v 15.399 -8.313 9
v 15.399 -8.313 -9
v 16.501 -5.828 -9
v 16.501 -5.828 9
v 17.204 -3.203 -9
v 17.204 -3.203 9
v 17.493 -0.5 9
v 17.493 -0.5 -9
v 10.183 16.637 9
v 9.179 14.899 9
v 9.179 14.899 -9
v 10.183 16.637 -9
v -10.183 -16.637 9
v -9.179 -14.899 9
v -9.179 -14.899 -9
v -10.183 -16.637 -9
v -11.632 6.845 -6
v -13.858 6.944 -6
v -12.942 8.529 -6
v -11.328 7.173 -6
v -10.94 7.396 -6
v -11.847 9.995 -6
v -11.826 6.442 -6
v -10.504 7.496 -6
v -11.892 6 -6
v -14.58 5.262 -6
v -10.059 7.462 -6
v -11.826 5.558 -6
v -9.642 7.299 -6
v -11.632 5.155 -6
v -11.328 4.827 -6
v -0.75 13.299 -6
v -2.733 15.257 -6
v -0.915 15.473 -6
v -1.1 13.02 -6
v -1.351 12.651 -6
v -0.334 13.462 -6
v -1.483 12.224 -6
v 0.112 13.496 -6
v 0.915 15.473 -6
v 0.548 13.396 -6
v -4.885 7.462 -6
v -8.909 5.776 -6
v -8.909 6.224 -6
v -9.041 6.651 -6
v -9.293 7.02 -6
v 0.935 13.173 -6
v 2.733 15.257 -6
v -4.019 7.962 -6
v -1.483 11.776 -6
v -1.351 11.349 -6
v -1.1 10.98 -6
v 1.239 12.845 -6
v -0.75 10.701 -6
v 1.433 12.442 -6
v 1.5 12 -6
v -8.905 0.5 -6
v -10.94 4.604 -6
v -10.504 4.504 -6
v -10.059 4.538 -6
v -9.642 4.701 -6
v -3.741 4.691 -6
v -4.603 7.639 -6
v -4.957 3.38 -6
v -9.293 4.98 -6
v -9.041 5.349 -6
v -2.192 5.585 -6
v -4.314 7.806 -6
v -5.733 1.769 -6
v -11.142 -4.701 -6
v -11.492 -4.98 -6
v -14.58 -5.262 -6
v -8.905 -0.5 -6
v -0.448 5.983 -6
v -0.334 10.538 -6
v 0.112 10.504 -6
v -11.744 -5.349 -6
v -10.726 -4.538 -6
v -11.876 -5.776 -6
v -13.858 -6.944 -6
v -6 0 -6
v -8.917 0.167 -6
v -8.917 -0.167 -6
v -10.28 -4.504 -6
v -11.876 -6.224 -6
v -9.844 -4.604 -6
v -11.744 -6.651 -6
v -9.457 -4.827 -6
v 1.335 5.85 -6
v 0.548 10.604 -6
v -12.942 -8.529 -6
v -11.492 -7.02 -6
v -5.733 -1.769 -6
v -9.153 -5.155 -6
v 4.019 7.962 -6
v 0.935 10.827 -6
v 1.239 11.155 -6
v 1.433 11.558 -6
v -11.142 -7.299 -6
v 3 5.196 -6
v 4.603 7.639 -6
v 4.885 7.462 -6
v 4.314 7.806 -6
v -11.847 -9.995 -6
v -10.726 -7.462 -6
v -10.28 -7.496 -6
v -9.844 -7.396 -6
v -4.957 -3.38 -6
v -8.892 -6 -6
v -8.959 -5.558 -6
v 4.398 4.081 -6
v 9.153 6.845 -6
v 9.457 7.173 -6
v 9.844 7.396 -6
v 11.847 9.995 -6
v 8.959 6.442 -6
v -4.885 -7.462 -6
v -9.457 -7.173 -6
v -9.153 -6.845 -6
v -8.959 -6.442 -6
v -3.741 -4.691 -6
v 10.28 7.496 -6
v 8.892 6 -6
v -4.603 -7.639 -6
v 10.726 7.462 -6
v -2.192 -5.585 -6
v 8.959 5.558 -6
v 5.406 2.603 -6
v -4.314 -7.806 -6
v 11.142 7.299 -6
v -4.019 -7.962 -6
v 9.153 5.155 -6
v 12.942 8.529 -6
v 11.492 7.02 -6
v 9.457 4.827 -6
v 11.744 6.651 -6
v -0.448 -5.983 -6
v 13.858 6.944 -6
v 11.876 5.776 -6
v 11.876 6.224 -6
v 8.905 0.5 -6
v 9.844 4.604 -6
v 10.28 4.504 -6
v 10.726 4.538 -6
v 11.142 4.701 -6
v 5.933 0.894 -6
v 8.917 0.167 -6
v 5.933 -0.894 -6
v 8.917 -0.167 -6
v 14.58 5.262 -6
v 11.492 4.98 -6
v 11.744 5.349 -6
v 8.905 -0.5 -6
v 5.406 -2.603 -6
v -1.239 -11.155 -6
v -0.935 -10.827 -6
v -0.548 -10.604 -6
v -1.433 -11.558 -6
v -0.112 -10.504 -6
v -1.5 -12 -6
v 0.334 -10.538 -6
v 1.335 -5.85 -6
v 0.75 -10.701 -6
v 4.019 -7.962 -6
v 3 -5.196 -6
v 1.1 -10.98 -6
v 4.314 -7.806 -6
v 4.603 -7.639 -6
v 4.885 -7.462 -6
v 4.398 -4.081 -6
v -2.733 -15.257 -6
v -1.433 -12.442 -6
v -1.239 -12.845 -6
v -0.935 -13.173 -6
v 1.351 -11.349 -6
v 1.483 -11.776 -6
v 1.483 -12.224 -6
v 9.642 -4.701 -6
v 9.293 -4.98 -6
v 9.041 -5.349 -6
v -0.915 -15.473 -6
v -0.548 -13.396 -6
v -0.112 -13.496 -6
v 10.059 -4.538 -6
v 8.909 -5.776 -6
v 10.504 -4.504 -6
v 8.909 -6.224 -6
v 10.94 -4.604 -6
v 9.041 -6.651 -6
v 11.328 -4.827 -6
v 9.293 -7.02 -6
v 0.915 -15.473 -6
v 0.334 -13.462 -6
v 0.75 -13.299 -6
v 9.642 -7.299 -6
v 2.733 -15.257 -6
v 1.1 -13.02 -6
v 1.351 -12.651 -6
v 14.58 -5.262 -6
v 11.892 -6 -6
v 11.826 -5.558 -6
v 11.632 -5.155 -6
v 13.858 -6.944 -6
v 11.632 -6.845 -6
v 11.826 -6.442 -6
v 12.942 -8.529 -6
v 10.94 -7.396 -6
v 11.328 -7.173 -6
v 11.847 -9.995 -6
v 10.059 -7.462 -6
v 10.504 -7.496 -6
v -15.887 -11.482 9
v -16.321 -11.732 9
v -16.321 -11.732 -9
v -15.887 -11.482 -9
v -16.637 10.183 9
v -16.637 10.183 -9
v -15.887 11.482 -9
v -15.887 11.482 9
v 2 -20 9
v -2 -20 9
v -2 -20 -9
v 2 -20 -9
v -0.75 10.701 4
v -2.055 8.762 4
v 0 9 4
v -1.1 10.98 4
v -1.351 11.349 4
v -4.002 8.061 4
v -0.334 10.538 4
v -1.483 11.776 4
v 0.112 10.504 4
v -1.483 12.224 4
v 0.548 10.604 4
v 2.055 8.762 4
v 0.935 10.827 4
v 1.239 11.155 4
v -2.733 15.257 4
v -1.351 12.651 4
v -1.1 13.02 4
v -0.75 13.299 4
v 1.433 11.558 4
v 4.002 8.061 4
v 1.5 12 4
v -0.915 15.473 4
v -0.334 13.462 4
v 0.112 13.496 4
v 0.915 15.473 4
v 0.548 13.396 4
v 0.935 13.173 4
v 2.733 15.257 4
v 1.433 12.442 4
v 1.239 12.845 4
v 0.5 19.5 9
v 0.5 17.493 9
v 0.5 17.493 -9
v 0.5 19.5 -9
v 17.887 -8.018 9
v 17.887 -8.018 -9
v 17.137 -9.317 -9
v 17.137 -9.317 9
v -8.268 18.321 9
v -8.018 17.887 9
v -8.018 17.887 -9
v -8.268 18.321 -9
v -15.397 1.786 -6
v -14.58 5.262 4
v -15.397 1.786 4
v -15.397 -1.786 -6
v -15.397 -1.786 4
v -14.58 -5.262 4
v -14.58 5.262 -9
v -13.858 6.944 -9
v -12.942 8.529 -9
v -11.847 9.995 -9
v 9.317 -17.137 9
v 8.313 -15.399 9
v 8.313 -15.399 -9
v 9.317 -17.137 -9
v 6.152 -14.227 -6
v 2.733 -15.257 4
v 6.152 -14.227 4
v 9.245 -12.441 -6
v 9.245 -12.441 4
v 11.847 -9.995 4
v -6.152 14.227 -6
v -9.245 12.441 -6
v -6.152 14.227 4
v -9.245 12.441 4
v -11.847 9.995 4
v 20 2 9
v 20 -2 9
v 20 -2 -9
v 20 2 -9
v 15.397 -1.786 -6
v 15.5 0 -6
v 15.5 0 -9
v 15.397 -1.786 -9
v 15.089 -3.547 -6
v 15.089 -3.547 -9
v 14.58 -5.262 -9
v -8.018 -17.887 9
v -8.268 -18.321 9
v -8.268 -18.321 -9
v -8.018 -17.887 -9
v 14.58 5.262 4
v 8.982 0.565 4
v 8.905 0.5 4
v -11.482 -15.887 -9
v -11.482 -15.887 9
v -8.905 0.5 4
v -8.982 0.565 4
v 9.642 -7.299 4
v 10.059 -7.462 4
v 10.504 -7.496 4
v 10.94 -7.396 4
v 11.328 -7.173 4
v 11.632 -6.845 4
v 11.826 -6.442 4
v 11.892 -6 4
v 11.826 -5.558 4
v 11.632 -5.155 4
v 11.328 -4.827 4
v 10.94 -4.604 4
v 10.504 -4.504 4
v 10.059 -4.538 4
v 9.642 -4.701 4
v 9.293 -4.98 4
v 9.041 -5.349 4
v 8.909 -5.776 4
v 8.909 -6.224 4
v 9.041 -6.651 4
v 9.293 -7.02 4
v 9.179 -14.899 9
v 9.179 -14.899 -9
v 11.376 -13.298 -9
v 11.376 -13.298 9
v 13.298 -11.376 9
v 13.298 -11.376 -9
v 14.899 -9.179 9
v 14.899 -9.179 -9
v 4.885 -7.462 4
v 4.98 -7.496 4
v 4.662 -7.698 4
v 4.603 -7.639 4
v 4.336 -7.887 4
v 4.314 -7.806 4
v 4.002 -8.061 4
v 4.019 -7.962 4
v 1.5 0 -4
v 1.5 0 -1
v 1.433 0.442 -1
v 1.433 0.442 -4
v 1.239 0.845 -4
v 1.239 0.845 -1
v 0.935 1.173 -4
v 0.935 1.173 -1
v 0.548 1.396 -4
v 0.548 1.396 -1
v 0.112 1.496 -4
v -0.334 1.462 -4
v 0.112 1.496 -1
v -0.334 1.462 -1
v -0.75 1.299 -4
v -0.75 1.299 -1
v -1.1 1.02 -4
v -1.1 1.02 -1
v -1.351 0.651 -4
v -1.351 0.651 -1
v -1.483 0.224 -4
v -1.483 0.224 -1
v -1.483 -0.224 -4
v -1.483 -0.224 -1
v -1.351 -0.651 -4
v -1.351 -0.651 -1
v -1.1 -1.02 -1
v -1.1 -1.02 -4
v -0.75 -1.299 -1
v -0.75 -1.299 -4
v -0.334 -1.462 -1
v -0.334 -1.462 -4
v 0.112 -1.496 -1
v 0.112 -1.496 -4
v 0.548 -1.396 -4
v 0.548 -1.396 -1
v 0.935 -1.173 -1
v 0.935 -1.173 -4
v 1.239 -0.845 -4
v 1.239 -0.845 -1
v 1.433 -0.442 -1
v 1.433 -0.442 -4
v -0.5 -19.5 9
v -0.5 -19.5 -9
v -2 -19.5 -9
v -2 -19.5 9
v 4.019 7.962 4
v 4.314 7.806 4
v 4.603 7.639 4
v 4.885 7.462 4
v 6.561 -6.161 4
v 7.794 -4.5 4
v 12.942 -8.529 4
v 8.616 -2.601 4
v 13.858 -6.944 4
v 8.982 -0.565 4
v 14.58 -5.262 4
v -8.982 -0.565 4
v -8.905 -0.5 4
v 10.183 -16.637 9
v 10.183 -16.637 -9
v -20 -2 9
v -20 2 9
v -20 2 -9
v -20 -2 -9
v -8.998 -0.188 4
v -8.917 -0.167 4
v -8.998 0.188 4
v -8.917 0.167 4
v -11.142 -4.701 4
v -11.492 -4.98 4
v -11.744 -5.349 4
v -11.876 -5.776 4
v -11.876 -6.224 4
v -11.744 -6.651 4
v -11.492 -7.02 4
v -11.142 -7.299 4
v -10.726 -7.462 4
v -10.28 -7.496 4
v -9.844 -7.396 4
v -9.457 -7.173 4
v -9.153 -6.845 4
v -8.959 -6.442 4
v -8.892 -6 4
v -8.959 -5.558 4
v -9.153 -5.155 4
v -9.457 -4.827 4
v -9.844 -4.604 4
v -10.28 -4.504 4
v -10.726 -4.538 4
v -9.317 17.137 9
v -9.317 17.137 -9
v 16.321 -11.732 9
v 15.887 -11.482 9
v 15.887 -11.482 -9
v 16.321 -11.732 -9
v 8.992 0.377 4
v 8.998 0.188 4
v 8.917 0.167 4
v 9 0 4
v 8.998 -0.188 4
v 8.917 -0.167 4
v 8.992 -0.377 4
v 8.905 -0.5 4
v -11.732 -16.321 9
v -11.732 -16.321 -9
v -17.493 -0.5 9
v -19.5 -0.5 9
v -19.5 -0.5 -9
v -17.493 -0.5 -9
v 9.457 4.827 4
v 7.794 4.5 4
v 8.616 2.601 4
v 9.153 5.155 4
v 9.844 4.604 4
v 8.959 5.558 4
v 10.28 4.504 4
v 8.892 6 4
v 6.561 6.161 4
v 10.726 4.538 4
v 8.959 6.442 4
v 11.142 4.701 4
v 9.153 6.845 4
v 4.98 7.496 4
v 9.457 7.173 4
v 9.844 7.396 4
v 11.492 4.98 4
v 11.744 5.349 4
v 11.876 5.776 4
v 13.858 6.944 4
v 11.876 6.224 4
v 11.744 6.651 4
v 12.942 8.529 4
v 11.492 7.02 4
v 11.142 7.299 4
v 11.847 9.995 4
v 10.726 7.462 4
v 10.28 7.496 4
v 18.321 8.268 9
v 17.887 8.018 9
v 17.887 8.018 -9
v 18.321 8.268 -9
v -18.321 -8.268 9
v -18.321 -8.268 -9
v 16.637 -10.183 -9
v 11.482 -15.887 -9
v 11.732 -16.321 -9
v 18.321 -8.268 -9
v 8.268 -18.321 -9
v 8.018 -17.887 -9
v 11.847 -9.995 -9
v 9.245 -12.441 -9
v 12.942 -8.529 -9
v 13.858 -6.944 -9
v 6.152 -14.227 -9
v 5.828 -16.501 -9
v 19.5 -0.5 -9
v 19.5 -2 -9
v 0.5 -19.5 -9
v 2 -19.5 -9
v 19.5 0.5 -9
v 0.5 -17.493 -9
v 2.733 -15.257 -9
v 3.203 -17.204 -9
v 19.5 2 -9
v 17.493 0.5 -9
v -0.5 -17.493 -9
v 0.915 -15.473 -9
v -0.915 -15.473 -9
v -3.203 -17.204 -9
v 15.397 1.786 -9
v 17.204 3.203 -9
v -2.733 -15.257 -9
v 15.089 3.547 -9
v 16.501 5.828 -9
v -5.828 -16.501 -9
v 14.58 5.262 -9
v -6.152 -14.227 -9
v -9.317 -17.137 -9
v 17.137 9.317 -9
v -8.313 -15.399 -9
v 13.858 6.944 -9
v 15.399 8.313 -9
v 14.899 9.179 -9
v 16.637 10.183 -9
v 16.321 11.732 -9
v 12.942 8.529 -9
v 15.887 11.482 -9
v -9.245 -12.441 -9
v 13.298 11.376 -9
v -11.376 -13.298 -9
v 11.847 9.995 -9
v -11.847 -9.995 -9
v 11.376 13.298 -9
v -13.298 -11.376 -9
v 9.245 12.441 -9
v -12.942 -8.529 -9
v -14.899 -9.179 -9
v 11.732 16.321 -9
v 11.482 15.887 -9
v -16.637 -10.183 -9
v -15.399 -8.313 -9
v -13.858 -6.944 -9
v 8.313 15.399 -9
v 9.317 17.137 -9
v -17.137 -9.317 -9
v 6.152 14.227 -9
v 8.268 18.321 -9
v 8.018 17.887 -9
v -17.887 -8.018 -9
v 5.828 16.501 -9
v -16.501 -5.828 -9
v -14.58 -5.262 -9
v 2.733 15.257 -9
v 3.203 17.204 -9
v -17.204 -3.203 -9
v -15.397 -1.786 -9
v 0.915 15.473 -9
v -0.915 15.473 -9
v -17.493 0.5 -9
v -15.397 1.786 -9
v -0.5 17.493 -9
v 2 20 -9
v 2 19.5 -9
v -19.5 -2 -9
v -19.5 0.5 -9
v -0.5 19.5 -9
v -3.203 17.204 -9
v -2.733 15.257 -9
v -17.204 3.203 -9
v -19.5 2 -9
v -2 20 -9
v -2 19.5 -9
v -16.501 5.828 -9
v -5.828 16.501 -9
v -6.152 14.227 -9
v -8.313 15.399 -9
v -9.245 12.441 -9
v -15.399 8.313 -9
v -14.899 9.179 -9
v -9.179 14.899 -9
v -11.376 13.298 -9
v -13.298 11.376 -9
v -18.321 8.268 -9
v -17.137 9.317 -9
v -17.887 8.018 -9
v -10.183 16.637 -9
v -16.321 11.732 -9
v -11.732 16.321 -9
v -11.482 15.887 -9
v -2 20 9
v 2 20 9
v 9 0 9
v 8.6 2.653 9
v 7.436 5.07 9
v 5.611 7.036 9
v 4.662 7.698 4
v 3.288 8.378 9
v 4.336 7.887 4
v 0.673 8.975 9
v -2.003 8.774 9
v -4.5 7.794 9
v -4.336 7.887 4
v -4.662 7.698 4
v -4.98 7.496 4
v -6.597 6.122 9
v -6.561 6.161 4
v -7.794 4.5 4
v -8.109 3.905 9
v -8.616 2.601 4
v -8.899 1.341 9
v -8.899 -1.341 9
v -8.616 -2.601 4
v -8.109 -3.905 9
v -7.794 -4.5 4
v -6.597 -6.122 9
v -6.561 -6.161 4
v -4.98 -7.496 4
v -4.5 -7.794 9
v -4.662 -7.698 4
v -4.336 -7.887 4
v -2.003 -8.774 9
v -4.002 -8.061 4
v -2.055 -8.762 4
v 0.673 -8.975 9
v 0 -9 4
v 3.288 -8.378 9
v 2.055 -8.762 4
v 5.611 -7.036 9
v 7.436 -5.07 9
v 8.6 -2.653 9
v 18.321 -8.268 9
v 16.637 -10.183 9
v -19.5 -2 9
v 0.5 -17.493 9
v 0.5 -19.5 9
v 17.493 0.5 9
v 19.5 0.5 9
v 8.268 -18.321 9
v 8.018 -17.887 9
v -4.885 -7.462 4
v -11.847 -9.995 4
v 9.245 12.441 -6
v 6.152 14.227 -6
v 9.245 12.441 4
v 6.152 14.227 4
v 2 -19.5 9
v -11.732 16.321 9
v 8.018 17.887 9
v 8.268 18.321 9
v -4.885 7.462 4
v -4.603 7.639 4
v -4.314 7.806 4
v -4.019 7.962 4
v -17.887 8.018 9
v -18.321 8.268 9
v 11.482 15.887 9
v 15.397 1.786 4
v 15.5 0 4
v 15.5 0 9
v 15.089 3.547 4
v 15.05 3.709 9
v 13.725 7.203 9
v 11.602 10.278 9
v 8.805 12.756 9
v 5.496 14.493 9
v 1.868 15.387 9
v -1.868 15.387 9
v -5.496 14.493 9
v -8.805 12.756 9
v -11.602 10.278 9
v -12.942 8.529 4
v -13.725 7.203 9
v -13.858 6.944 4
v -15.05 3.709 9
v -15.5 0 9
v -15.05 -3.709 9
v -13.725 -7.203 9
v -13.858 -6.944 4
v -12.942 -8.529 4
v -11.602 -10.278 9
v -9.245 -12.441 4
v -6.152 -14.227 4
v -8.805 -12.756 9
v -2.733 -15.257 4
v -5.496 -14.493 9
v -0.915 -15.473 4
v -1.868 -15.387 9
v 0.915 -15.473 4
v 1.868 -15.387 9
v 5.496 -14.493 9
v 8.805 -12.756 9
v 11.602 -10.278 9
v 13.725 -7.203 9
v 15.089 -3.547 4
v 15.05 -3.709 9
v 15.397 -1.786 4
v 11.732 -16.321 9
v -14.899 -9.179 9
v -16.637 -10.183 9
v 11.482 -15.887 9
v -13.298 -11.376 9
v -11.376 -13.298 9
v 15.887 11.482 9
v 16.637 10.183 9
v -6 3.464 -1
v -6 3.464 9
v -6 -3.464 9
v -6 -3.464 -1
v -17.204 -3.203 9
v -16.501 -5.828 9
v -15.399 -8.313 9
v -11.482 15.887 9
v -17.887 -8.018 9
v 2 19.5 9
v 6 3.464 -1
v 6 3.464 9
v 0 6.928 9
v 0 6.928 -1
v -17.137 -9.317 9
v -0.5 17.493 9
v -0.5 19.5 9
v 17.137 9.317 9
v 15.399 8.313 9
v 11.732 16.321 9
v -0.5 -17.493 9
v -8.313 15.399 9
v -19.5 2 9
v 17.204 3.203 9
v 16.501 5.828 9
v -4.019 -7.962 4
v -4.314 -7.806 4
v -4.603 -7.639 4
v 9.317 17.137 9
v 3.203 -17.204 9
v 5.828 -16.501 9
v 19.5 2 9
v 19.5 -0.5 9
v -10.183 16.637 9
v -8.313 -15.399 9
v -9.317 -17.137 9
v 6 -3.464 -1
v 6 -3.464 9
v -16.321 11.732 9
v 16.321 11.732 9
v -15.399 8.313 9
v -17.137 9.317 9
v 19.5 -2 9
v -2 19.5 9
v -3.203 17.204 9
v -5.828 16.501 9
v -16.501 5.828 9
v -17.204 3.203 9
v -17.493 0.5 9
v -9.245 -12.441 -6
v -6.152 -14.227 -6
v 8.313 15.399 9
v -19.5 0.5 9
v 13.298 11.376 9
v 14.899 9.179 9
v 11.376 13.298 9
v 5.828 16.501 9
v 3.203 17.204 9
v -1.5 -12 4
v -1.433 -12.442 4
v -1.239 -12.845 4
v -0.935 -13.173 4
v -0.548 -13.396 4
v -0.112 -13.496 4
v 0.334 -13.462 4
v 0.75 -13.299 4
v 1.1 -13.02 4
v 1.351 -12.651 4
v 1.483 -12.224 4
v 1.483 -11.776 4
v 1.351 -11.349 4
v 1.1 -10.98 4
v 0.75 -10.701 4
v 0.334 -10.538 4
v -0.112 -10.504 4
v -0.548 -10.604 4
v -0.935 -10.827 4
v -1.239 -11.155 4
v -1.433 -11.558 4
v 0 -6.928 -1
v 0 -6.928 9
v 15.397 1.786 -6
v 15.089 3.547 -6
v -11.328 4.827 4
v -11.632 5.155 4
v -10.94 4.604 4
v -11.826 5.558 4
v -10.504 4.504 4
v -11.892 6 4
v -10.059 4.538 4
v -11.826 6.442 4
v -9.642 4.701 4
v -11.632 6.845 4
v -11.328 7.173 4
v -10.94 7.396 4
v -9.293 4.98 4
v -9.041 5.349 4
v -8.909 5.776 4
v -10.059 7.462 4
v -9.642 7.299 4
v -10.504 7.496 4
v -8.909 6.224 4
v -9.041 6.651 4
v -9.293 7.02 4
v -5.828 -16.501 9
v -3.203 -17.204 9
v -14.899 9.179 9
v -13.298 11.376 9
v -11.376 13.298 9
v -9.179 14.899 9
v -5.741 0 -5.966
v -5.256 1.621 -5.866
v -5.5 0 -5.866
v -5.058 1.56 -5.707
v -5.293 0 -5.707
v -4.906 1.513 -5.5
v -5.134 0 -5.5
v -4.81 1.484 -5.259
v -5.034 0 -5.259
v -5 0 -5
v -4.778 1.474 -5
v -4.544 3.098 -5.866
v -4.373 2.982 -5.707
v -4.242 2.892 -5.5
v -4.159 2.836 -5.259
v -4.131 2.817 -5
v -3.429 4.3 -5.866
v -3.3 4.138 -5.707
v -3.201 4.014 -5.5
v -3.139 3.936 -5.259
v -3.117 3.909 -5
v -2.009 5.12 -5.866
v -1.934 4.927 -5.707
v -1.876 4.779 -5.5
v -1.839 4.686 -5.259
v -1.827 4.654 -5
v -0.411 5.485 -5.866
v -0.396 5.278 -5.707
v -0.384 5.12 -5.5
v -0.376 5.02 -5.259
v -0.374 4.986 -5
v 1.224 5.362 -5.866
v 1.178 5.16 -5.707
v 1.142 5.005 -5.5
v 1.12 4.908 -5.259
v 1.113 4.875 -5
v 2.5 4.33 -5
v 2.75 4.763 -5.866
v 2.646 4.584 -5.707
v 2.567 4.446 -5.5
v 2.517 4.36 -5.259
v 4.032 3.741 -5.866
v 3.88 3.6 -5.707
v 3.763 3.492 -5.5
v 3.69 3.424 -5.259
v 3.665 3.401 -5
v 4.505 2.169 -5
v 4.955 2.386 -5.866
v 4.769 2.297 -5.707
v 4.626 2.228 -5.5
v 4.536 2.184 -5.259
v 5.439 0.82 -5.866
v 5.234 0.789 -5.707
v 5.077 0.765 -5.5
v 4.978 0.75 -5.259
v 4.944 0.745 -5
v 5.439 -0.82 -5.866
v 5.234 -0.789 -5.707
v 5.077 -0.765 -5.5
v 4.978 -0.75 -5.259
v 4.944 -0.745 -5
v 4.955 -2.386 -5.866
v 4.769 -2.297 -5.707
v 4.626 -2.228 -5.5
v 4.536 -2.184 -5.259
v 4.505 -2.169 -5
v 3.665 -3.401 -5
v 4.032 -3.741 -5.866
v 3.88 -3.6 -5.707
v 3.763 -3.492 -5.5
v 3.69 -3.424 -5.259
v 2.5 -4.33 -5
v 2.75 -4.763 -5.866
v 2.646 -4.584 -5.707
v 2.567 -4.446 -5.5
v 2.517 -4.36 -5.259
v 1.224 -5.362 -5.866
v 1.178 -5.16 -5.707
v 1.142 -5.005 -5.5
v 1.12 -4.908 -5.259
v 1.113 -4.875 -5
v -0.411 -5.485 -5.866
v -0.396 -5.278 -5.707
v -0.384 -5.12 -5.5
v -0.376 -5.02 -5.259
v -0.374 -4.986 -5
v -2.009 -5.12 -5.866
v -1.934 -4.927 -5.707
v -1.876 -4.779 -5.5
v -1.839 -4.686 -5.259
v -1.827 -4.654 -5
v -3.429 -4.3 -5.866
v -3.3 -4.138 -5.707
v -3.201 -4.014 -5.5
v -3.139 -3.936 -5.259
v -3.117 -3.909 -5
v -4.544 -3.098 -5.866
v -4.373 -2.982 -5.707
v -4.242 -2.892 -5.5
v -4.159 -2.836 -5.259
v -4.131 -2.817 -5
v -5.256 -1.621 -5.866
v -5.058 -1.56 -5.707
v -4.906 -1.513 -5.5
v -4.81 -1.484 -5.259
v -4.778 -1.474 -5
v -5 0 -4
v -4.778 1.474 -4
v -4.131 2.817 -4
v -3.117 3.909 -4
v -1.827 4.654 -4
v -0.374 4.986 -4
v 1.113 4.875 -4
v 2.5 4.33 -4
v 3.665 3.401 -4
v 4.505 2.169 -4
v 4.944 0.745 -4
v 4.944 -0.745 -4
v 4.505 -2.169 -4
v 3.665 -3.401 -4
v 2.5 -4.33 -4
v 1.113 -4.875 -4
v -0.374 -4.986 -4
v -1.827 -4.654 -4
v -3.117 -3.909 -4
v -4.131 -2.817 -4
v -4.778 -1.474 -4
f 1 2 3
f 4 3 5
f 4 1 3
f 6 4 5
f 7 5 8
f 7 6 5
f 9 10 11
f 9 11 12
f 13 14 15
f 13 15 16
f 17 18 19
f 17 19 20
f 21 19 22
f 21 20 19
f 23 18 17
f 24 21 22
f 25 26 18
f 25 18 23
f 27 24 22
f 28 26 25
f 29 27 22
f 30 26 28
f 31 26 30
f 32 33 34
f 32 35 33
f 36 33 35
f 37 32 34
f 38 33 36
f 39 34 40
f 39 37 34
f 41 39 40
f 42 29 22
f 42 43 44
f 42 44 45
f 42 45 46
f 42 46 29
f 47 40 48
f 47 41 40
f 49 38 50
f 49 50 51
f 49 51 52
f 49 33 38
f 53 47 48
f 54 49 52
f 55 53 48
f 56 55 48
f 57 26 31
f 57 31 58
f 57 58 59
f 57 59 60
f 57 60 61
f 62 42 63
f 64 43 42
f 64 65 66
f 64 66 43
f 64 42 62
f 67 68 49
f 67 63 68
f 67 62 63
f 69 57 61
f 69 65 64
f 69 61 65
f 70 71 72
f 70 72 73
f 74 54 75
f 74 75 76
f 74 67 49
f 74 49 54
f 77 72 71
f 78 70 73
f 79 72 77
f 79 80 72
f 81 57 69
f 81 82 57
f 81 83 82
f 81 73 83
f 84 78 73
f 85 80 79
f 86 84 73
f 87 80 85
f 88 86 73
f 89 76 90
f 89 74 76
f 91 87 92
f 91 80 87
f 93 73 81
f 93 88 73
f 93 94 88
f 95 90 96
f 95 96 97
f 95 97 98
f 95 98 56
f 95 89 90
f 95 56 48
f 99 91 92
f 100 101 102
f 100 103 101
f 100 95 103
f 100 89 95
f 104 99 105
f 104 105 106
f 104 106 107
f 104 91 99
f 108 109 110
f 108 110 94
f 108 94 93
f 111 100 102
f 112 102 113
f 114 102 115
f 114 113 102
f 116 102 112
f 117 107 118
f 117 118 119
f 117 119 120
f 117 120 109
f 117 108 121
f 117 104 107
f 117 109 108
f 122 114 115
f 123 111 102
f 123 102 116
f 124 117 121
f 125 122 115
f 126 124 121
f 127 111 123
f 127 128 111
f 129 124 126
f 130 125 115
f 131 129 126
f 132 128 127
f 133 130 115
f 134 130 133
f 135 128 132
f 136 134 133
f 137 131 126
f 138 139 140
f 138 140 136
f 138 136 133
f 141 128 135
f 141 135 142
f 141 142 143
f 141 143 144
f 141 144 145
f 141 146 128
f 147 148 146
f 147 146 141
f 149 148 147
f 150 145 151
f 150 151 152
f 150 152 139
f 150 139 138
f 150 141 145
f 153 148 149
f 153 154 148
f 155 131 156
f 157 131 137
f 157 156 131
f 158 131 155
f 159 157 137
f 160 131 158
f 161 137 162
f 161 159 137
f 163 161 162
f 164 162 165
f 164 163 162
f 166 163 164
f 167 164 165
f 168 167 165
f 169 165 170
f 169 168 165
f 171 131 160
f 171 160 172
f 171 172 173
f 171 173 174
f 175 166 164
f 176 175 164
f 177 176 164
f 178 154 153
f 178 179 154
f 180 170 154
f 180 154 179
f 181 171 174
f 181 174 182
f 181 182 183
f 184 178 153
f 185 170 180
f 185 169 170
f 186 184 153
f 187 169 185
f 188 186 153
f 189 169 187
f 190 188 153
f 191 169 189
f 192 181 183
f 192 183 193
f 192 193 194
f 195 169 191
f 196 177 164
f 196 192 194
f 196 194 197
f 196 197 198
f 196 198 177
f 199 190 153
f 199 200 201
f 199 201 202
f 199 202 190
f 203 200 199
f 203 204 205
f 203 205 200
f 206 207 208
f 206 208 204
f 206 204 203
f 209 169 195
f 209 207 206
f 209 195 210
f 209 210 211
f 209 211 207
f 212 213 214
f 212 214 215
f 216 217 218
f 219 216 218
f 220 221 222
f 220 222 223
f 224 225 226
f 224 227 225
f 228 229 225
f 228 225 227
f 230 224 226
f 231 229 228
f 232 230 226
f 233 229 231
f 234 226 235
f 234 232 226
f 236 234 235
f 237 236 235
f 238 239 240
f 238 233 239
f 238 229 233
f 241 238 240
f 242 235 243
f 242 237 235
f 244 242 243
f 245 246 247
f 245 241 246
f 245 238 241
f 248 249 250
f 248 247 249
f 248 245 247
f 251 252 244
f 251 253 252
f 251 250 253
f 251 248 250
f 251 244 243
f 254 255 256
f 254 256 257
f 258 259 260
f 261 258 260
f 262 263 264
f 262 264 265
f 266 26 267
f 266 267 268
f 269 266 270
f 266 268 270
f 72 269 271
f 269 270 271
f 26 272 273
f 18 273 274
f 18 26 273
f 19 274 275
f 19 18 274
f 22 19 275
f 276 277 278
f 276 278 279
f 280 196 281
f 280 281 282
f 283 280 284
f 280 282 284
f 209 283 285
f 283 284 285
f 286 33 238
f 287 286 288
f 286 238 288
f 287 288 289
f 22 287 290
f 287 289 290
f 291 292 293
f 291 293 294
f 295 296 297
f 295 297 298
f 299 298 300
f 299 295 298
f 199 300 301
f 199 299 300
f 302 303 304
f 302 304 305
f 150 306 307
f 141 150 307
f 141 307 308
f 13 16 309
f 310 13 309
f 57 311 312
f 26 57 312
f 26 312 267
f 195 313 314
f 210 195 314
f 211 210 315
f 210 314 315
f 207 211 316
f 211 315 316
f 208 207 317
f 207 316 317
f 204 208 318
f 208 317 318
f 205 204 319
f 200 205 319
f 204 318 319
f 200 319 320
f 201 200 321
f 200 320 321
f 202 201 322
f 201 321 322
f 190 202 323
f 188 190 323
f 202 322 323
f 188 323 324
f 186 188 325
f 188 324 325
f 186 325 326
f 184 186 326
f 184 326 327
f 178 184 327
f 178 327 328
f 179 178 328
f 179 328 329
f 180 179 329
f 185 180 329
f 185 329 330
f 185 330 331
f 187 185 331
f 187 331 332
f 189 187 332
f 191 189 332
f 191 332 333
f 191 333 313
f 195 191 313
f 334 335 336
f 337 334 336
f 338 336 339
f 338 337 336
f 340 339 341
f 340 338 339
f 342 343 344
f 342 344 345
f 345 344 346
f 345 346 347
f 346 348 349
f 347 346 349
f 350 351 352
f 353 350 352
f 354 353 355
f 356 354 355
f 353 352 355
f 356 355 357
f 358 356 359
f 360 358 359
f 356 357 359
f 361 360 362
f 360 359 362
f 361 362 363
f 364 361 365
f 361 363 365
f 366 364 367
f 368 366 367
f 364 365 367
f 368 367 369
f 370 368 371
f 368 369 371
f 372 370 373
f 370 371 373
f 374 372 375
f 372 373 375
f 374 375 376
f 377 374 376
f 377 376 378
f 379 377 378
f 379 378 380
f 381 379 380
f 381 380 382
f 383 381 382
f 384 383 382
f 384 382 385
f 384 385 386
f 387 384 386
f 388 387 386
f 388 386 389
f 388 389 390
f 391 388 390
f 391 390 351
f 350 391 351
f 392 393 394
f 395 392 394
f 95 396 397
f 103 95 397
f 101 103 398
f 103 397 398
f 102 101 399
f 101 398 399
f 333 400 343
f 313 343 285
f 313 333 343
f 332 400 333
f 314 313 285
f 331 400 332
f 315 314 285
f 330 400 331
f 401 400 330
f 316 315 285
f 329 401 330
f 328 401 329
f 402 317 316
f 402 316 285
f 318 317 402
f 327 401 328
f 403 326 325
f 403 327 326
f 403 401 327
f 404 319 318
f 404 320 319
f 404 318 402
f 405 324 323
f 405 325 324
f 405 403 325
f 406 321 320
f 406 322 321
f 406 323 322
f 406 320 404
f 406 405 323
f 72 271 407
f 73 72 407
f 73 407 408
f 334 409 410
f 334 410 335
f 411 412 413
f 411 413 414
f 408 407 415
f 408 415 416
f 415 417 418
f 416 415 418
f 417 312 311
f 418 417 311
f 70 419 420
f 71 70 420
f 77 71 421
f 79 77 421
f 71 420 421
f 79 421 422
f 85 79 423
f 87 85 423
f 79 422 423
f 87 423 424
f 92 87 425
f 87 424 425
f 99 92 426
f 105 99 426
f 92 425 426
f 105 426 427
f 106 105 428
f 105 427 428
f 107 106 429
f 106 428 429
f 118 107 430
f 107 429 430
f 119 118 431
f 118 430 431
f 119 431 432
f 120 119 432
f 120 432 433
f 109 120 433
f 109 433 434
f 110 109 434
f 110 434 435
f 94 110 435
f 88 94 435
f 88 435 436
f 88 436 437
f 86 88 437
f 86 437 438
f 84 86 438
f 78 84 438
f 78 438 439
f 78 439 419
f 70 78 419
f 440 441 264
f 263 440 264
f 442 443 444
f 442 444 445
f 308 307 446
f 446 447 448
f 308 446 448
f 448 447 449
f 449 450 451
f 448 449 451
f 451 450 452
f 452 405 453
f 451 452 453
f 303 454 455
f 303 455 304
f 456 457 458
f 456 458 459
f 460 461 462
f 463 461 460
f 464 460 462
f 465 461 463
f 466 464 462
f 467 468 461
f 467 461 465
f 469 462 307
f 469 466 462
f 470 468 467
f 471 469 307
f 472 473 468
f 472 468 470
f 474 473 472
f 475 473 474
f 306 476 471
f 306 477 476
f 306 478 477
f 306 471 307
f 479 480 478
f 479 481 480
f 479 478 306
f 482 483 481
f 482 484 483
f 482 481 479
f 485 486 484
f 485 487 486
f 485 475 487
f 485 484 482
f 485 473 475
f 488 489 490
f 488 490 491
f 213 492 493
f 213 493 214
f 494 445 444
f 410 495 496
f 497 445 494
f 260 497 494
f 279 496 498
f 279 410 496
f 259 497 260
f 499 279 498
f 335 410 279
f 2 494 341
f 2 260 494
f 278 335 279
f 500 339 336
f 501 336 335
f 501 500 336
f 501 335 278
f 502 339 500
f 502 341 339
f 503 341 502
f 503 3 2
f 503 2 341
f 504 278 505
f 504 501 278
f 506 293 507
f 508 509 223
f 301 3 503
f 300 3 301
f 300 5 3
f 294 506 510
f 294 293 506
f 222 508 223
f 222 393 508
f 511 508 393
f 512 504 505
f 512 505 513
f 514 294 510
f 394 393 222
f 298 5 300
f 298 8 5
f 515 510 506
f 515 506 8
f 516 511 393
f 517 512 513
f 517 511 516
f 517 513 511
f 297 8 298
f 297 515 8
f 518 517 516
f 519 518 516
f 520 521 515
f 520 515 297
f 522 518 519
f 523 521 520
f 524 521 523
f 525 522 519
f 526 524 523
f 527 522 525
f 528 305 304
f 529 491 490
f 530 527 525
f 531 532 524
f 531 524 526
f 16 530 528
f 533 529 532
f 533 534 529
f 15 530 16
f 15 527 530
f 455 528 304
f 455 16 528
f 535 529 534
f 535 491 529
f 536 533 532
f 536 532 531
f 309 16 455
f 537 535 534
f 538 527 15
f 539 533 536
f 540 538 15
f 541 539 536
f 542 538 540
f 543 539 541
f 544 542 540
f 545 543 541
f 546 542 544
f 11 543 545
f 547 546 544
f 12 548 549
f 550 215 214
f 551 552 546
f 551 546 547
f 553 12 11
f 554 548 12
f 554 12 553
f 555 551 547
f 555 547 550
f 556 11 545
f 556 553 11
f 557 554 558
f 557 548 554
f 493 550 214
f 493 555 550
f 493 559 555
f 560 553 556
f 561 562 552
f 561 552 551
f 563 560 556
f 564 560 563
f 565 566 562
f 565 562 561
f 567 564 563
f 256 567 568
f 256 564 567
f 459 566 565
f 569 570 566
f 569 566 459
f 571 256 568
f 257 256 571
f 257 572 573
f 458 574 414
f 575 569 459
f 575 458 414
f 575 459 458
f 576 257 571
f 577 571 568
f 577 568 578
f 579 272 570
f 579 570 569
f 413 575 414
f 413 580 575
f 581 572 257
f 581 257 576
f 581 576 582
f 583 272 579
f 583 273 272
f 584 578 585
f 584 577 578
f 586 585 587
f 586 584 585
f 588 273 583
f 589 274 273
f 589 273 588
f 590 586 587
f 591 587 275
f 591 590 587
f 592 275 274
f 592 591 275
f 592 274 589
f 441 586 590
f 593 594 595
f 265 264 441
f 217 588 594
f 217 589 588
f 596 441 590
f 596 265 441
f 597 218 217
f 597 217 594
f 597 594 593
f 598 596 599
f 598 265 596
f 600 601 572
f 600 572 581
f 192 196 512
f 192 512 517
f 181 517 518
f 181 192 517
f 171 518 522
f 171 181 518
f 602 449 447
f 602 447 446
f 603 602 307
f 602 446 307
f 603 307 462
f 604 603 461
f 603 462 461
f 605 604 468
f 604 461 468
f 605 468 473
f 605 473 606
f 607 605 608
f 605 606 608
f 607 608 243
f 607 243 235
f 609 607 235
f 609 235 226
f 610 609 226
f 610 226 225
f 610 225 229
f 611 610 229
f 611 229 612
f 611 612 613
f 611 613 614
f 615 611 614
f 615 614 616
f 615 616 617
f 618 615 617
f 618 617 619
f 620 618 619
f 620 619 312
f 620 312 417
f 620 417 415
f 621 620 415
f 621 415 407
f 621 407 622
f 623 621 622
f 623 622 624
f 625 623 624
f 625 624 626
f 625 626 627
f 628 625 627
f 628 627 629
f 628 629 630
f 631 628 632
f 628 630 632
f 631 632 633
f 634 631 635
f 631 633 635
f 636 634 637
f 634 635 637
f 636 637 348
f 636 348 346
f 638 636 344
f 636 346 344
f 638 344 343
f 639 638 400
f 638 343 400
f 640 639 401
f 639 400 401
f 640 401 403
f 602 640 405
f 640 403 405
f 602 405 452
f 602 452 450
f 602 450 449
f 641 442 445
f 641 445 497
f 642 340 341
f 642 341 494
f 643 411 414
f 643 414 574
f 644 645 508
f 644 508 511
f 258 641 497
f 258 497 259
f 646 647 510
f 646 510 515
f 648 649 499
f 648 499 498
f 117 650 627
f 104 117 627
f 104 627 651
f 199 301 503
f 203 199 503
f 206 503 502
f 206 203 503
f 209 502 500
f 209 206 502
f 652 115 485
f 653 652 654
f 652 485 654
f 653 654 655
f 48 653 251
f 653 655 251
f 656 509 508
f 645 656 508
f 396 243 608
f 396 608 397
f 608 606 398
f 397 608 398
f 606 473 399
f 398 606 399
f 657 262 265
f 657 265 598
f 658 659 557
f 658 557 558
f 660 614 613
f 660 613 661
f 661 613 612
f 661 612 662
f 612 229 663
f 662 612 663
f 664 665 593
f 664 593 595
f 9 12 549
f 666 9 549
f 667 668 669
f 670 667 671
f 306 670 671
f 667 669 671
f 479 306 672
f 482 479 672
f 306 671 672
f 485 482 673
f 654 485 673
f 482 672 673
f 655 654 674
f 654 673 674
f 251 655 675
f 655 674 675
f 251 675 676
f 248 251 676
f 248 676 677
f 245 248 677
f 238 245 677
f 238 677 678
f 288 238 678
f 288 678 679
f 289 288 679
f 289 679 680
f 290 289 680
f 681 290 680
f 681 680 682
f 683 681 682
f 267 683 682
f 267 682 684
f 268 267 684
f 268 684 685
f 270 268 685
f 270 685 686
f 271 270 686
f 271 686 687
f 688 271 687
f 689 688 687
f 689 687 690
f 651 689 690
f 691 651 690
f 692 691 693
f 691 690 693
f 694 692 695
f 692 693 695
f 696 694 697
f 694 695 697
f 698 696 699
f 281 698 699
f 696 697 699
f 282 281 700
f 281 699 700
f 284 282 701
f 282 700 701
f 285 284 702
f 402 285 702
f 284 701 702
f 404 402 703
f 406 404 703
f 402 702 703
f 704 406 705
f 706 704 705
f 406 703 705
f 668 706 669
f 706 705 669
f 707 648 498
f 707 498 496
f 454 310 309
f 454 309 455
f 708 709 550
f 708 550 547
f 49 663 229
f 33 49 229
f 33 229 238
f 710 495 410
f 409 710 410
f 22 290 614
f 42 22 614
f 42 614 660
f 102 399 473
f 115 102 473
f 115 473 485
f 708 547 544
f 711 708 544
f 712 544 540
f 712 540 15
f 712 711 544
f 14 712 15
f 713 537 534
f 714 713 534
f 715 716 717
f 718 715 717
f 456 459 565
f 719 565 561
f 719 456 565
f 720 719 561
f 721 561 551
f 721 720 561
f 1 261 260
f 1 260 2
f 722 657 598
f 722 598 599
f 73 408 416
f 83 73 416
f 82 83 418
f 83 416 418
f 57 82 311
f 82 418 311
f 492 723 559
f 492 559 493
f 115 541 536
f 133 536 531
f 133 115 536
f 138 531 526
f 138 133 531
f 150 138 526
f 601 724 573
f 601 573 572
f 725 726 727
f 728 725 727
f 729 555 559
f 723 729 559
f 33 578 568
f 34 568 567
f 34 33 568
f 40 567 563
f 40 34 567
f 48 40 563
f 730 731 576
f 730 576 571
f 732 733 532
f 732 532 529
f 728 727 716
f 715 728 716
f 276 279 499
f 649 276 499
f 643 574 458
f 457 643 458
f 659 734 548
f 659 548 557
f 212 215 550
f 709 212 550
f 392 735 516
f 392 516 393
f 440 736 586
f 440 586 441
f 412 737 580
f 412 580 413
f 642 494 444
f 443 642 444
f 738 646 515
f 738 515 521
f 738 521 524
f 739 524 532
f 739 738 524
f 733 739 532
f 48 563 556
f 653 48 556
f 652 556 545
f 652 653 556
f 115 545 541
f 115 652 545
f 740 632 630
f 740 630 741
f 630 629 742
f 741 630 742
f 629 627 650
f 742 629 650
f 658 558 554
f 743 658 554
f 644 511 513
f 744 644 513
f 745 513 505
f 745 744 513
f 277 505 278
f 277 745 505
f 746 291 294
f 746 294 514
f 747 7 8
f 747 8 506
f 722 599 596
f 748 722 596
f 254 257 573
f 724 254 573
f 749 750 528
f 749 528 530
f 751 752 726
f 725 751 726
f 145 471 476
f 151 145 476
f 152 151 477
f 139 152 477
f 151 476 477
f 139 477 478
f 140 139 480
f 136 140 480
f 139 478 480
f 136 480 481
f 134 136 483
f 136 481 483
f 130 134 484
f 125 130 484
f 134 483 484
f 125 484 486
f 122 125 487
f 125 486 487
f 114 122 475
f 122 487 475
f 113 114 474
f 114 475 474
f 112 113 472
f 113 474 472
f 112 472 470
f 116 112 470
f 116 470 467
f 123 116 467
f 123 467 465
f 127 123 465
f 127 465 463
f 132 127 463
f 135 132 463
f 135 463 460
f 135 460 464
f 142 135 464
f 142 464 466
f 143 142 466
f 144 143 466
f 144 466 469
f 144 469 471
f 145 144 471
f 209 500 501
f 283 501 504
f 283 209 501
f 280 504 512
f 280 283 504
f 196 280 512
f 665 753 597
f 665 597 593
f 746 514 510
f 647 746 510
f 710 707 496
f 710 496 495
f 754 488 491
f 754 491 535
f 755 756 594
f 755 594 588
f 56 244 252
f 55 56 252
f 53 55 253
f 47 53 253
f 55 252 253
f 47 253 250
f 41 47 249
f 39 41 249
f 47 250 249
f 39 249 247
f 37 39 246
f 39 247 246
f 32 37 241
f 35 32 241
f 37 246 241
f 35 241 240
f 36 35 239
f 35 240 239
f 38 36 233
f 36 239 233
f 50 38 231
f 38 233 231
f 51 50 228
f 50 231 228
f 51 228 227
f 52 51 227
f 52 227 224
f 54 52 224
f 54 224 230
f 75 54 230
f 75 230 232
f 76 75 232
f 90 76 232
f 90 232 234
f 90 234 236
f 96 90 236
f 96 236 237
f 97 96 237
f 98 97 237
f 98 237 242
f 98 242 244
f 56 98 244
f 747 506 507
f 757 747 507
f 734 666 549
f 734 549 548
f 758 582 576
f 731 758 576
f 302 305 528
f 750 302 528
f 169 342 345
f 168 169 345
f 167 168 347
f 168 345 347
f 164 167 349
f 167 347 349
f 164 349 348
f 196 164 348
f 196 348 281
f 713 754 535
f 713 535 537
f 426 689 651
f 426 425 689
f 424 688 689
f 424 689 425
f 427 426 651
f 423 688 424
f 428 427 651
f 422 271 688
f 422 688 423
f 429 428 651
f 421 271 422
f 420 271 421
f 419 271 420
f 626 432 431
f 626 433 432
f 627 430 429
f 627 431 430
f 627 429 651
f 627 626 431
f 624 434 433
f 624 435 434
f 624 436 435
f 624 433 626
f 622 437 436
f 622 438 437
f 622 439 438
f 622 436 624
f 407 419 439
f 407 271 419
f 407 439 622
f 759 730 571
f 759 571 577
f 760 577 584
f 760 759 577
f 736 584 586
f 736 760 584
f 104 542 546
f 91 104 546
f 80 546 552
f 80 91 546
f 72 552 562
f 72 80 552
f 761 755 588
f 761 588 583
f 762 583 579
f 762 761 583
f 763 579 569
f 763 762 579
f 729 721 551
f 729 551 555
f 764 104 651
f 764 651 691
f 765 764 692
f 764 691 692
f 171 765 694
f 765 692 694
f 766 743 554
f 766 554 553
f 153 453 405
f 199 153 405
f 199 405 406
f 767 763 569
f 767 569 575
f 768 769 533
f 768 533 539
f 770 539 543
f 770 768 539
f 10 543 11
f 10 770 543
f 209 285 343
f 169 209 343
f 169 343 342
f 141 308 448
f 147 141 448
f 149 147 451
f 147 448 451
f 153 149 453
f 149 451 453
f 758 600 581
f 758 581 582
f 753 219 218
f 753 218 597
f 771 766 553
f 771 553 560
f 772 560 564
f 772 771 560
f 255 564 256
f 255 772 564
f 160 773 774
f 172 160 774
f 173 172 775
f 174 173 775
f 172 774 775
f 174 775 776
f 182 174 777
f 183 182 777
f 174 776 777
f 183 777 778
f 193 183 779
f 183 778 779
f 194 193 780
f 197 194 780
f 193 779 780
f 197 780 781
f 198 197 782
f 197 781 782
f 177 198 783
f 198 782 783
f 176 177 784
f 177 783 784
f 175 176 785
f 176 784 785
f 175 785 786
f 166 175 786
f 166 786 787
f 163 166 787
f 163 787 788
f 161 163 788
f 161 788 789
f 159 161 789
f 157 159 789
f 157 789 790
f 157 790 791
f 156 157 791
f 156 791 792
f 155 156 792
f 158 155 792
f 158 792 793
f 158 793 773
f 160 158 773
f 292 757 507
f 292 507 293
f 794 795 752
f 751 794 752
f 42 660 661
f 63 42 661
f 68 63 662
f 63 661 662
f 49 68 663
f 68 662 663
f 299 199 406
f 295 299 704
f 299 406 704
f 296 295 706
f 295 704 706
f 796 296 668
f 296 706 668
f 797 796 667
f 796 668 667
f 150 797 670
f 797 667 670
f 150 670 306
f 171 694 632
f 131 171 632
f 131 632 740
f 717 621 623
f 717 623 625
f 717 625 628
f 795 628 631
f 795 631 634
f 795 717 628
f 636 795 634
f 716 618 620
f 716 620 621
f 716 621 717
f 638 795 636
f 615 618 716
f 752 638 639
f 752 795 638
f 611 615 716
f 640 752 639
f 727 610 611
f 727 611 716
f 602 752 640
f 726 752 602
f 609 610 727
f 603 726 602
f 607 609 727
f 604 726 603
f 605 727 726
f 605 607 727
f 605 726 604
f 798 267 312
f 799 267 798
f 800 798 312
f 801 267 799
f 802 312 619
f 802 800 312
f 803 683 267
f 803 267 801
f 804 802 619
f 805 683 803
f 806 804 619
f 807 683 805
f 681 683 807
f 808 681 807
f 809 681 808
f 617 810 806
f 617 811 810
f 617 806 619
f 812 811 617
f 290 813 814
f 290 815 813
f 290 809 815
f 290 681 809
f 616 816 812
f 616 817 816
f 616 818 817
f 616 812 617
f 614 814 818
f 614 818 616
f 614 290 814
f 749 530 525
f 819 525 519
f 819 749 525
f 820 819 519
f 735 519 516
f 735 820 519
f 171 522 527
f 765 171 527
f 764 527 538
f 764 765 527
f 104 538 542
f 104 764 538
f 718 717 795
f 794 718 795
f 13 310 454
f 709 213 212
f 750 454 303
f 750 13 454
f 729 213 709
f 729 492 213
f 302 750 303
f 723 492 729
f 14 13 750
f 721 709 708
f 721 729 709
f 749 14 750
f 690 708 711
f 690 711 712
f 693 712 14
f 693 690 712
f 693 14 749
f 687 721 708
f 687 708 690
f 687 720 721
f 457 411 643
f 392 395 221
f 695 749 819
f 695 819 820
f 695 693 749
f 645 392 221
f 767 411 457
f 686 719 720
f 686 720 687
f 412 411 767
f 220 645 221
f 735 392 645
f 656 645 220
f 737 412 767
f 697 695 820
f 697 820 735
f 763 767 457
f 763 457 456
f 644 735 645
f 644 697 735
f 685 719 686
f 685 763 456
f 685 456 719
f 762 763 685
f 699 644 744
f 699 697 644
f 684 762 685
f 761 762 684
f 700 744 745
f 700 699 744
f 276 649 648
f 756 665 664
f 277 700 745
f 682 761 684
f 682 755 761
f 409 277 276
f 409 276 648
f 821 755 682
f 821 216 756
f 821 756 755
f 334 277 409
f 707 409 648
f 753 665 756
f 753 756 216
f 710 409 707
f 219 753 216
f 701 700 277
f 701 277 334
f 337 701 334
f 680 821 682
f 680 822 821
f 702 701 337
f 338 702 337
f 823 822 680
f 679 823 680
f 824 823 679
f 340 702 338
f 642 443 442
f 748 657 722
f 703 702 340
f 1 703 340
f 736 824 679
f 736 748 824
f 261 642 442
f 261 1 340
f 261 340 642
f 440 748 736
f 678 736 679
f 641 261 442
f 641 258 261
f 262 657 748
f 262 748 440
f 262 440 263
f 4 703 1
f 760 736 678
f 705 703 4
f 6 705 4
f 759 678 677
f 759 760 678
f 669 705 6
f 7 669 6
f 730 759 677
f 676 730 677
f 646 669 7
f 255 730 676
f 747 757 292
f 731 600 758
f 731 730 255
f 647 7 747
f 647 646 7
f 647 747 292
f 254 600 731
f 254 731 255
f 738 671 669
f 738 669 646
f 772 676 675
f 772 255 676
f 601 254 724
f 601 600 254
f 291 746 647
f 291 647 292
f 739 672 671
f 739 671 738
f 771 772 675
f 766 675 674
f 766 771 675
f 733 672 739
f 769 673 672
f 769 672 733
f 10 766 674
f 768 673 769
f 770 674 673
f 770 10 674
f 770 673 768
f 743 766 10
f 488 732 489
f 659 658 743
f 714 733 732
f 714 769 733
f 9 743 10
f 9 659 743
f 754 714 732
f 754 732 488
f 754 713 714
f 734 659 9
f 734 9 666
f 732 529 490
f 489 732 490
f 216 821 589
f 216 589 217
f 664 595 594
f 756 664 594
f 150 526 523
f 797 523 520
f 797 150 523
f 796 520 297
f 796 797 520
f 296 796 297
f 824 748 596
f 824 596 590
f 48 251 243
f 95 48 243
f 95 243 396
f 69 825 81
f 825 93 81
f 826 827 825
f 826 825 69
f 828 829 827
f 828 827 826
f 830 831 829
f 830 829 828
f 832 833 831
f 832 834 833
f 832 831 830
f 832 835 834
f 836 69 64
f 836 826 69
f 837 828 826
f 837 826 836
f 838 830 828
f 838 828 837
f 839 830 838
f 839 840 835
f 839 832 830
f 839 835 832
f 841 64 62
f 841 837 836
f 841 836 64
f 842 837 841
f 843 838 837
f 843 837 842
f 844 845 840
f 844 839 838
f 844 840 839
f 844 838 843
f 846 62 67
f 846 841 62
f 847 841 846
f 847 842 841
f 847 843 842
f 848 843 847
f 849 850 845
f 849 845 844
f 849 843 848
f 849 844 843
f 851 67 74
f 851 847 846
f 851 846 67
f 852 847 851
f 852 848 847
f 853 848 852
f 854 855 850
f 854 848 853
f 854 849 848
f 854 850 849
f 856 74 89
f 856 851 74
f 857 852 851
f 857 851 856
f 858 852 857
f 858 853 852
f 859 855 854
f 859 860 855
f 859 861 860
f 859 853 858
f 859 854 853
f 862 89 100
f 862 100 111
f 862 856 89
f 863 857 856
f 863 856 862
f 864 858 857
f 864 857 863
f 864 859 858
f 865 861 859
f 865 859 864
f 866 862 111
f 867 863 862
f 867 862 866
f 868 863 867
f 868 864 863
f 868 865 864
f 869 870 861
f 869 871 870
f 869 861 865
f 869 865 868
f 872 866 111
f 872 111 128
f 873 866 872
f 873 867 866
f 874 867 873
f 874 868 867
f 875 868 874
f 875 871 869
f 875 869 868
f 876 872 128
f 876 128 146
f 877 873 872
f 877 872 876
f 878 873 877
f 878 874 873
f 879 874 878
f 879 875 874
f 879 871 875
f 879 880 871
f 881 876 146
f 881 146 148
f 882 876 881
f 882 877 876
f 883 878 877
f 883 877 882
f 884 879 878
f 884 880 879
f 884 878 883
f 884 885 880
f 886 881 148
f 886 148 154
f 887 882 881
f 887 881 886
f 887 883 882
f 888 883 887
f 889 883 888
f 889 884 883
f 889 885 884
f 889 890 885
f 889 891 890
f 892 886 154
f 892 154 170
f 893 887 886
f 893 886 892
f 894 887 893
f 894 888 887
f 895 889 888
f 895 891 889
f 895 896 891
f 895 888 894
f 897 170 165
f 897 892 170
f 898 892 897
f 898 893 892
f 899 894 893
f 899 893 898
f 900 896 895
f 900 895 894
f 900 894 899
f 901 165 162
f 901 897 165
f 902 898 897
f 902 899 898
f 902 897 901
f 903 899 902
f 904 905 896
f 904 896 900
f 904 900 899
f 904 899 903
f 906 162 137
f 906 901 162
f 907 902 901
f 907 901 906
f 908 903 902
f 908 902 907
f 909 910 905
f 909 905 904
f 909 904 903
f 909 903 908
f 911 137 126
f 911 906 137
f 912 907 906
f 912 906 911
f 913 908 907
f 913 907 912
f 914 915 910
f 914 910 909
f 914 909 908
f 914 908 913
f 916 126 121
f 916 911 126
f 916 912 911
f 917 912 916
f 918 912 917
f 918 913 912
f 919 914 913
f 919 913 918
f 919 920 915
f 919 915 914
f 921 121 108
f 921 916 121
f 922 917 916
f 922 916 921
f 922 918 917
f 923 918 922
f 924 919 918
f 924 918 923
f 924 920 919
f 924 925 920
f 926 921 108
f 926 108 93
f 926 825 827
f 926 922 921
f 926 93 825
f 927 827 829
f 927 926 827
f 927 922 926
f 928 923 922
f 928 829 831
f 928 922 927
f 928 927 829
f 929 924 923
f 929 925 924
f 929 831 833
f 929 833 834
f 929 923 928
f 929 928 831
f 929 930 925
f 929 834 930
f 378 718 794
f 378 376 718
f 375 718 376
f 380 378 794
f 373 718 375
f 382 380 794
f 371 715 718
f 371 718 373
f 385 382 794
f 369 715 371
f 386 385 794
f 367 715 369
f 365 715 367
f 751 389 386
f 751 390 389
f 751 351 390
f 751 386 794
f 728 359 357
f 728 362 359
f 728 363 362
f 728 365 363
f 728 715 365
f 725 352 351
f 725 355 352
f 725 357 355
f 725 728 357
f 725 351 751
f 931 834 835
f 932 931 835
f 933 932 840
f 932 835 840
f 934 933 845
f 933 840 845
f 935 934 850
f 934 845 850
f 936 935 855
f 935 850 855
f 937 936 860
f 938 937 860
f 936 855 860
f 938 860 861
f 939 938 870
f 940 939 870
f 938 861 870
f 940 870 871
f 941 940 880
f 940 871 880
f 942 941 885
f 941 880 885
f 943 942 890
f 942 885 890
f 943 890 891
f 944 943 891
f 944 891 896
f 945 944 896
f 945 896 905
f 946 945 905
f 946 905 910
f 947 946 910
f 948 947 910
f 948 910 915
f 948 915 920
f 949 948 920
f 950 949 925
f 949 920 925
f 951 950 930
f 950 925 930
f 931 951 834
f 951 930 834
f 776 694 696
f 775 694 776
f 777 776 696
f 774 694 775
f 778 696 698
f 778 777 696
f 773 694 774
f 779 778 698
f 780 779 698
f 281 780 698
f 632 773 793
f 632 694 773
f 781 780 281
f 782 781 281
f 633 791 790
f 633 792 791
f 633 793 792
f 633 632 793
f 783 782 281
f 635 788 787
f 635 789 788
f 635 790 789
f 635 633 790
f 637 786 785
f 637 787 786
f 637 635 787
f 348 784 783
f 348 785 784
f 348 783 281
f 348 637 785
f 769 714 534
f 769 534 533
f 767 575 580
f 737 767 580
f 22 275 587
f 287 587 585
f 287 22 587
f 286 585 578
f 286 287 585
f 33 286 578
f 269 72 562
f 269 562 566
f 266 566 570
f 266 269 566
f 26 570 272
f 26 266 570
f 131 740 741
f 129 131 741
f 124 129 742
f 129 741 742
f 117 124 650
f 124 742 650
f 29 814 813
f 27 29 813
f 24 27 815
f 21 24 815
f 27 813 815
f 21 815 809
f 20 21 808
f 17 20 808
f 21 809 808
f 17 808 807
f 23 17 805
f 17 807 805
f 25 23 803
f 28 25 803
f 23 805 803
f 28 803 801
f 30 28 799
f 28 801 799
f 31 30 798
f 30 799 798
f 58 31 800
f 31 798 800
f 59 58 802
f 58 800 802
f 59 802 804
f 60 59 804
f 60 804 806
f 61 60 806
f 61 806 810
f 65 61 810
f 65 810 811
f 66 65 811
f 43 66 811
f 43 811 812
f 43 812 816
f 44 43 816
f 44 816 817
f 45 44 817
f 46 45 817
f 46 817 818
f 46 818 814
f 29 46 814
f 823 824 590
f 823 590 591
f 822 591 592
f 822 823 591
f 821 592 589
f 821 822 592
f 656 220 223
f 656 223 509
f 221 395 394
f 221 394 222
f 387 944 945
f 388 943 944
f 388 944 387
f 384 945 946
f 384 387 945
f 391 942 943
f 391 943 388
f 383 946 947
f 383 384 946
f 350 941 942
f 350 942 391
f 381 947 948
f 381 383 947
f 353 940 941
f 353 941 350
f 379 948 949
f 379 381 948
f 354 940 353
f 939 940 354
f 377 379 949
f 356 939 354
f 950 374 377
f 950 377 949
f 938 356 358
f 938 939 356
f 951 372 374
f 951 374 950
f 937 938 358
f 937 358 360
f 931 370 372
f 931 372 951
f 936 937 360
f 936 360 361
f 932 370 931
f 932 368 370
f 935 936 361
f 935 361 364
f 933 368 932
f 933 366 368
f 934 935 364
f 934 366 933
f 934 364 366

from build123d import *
from build123d.topology import SkipClean

# Parameters (mm, degrees)
SKETCH_1_R               = 27
EXTRUDE_1_DEPTH          = 10
FILLET_1_R               = 2
SKETCH_2_R               = 15.5
CUT_EXTRUDE_2_DEPTH      = 6
SKETCH_4_R               = 9
EXTRUDE_2_DEPTH          = 5
CUT_EXTRUDE_3_DEPTH      = 10
SKETCH_6_R               = 1.5
CUT_EXTRUDE_4_DEPTH      = 40.736633041
CUT_EXTRUDE_START        = -4
SKETCH_8_R               = 15.5
CUT_EXTRUDE_5_DEPTH      = 4
CUT_EXTRUDE_8_DEPTH      = 41.669398882
SKETCH_10_R              = 1.5
CUT_EXTRUDE_9_DEPTH      = 41.669398882
PATTERN_CIRCULAR_2_COUNT = 6
SKETCH_11_R              = 5
CUT_EXTRUDE_10_DEPTH     = 2
FILLET_2_R               = 1
SKETCH_12_OUTSIDE_W      = 71.788
SKETCH_12_OUTSIDE_H      = 71.788
SKETCH_12_OUTSIDE_R      = 17.5
CUT_EXTRUDE_11_DEPTH     = 20
EXTRUDE_3_DEPTH          = 10
PATTERN_CIRCULAR_3_COUNT = 12
SKETCH_15_R              = 32.027558883
CUT_EXTRUDE_12_DEPTH     = 1
SKETCH_16_R              = 25.808515359
CUT_EXTRUDE_13_DEPTH     = 1


with BuildPart() as part:
    # 草图1 → 凸台-拉伸1 (new, symmetric)
    with BuildSketch(Plane.XY):
        Circle(SKETCH_1_R)
    extrude(amount=EXTRUDE_1_DEPTH, both=True)

    # 圆角1
    fillet_1_edges = [part.edges().sort_by_distance(p)[0] for p in [
        (-27, 0, -10),
        (-27, 0, 10),
    ]]
    fillet(fillet_1_edges, radius=FILLET_1_R)

    # 草图2 → 切除-拉伸2 (cut)
    with BuildSketch(Plane.XY.offset(10)):
        Circle(SKETCH_2_R)
    extrude(amount=-CUT_EXTRUDE_2_DEPTH, mode=Mode.SUBTRACT)

    # 草图4 → 凸台-拉伸2 (add)
    with BuildSketch(Plane.XY.offset(4)):
        Circle(SKETCH_4_R)
    extrude(amount=EXTRUDE_2_DEPTH)

    # 草图5 → 切除-拉伸3 (cut)
    with BuildSketch(Plane.XY.offset(9)):
        Polygon((0, 6.92820323), (-6, 3.464101615), (-6, -3.464101615), (0, -6.92820323), (6, -3.464101615), (6, 3.464101615), align=None)
    extrude(amount=-CUT_EXTRUDE_3_DEPTH, mode=Mode.SUBTRACT)

    # 草图6 → 切除-拉伸4 (cut, through all)
    with BuildSketch(Plane.XY.offset(-1)):
        Circle(SKETCH_6_R)
    extrude(amount=-CUT_EXTRUDE_4_DEPTH, mode=Mode.SUBTRACT)

    # 草图8 → 切除-拉伸5 (cut)
    with BuildSketch(Plane(origin=(0, 0, -10), x_dir=(-1, 0, 0), z_dir=(0, 0, -1)).offset(CUT_EXTRUDE_START)):
        with Locations(Location((0, 0, 0), (0, 0, 180))):
            Circle(SKETCH_8_R)
    extrude(amount=CUT_EXTRUDE_5_DEPTH, mode=Mode.SUBTRACT)

    # 草图9 → 切除-拉伸8 (cut, through all)
    with SkipClean():  # the faces are left unmerged after this step: merging them gives an invalid solid
        with BuildSketch(Plane.XY.offset(4)):
            with BuildLine():
                Line((-8.904732448, 0.5), (-14.57957217, 5.261755918))
                ThreePointArc((-14.57957217, 5.261755918), (-15.5, 0), (-14.57957217, -5.261755918))
                Line((-14.57957217, -5.261755918), (-8.904732448, -0.5))
                ThreePointArc((-8.904732448, -0.5), (-8.91875888, 0), (-8.904732448, 0.5))
            make_face()
        cut_extrude_8 = extrude(amount=-CUT_EXTRUDE_8_DEPTH, mode=Mode.SUBTRACT)
    add(part.part.scale(1), mode=Mode.REPLACE)  # the faces are merged on a copy

    # 草图10 → 切除-拉伸9 (cut, through all)
    with BuildSketch(Plane.XY.offset(4)):
        with Locations((0, 12)):
            Circle(SKETCH_10_R)
    cut_extrude_9 = extrude(amount=-CUT_EXTRUDE_9_DEPTH, mode=Mode.SUBTRACT)

    # 阵列(圆周)2: 切除-拉伸8, 切除-拉伸9 ×6 about axis
    with SkipClean():  # the faces are left unmerged after this step: merging them gives an invalid solid
        pattern_circular_2_axis = Axis((0, 0, 0), (0, 0, 1))
        add([cut_extrude_8.rotate(pattern_circular_2_axis, i * 360 / PATTERN_CIRCULAR_2_COUNT) for i in range(1, PATTERN_CIRCULAR_2_COUNT)], mode=Mode.SUBTRACT)
        add([cut_extrude_9.rotate(pattern_circular_2_axis, i * 360 / PATTERN_CIRCULAR_2_COUNT) for i in range(1, PATTERN_CIRCULAR_2_COUNT)], mode=Mode.SUBTRACT)

    # 草图11 → 切除-拉伸10 (cut)
    with SkipClean():  # the faces are left unmerged after this step: merging them gives an invalid solid
        with BuildSketch(Plane(origin=(0, 0, -6), x_dir=(-1, 0, 0), z_dir=(0, 0, -1))):
            Circle(SKETCH_11_R)
        extrude(amount=-CUT_EXTRUDE_10_DEPTH, mode=Mode.SUBTRACT)

    # 圆角2
    fillet_2_edges = [part.edges().sort_by_distance(p)[0] for p in [
        (5, 0, -6),
    ]]
    fillet(fillet_2_edges, radius=FILLET_2_R)

    # 草图12 outside → 切除-拉伸11 (cut)
    with BuildSketch(Plane.XY.offset(10)):
        Rectangle(SKETCH_12_OUTSIDE_W, SKETCH_12_OUTSIDE_H)
        Circle(SKETCH_12_OUTSIDE_R, mode=Mode.SUBTRACT)
    extrude(amount=-CUT_EXTRUDE_11_DEPTH, mode=Mode.SUBTRACT)

    # 草图13 → 凸台-拉伸3 (add, symmetric)
    with BuildSketch(Plane.XY):
        with BuildLine():
            Line((0.5, 17.492855685), (0.5, 19.5))
            Line((0.5, 19.5), (2, 19.5))
            Line((2, 19.5), (2, 20))
            Line((2, 20), (-2, 20))
            Line((-2, 20), (-2, 19.5))
            Line((-2, 19.5), (-0.5, 19.5))
            Line((-0.5, 19.5), (-0.5, 17.492855685))
            ThreePointArc((-0.5, 17.492855685), (0, 17.5), (0.5, 17.492855685))
        make_face()
    extrude_3 = extrude(amount=EXTRUDE_3_DEPTH, both=True)

    # 阵列(圆周)3: 凸台-拉伸3 ×12 about axis
    with SkipClean():  # the faces are left unmerged after this step: merging them gives an invalid solid
        pattern_circular_3_axis = Axis((0, 0, 0), (0, 0, 1))
        for i in range(1, PATTERN_CIRCULAR_3_COUNT):
            add(extrude_3.rotate(pattern_circular_3_axis, i * 360 / PATTERN_CIRCULAR_3_COUNT))

    # 草图15 → 切除-拉伸12 (cut)
    with SkipClean():  # the faces are left unmerged after this step: merging them gives an invalid solid
        with BuildSketch(Plane(origin=(0, 0, -10), x_dir=(-1, 0, 0), z_dir=(0, 0, -1))):
            Circle(SKETCH_15_R)
        extrude(amount=-CUT_EXTRUDE_12_DEPTH, mode=Mode.SUBTRACT)

    # 草图16 → 切除-拉伸13 (cut)
    with BuildSketch(Plane.XY.offset(10)):
        Circle(SKETCH_16_R)
    extrude(amount=-CUT_EXTRUDE_13_DEPTH, mode=Mode.SUBTRACT)


solid = part.part
